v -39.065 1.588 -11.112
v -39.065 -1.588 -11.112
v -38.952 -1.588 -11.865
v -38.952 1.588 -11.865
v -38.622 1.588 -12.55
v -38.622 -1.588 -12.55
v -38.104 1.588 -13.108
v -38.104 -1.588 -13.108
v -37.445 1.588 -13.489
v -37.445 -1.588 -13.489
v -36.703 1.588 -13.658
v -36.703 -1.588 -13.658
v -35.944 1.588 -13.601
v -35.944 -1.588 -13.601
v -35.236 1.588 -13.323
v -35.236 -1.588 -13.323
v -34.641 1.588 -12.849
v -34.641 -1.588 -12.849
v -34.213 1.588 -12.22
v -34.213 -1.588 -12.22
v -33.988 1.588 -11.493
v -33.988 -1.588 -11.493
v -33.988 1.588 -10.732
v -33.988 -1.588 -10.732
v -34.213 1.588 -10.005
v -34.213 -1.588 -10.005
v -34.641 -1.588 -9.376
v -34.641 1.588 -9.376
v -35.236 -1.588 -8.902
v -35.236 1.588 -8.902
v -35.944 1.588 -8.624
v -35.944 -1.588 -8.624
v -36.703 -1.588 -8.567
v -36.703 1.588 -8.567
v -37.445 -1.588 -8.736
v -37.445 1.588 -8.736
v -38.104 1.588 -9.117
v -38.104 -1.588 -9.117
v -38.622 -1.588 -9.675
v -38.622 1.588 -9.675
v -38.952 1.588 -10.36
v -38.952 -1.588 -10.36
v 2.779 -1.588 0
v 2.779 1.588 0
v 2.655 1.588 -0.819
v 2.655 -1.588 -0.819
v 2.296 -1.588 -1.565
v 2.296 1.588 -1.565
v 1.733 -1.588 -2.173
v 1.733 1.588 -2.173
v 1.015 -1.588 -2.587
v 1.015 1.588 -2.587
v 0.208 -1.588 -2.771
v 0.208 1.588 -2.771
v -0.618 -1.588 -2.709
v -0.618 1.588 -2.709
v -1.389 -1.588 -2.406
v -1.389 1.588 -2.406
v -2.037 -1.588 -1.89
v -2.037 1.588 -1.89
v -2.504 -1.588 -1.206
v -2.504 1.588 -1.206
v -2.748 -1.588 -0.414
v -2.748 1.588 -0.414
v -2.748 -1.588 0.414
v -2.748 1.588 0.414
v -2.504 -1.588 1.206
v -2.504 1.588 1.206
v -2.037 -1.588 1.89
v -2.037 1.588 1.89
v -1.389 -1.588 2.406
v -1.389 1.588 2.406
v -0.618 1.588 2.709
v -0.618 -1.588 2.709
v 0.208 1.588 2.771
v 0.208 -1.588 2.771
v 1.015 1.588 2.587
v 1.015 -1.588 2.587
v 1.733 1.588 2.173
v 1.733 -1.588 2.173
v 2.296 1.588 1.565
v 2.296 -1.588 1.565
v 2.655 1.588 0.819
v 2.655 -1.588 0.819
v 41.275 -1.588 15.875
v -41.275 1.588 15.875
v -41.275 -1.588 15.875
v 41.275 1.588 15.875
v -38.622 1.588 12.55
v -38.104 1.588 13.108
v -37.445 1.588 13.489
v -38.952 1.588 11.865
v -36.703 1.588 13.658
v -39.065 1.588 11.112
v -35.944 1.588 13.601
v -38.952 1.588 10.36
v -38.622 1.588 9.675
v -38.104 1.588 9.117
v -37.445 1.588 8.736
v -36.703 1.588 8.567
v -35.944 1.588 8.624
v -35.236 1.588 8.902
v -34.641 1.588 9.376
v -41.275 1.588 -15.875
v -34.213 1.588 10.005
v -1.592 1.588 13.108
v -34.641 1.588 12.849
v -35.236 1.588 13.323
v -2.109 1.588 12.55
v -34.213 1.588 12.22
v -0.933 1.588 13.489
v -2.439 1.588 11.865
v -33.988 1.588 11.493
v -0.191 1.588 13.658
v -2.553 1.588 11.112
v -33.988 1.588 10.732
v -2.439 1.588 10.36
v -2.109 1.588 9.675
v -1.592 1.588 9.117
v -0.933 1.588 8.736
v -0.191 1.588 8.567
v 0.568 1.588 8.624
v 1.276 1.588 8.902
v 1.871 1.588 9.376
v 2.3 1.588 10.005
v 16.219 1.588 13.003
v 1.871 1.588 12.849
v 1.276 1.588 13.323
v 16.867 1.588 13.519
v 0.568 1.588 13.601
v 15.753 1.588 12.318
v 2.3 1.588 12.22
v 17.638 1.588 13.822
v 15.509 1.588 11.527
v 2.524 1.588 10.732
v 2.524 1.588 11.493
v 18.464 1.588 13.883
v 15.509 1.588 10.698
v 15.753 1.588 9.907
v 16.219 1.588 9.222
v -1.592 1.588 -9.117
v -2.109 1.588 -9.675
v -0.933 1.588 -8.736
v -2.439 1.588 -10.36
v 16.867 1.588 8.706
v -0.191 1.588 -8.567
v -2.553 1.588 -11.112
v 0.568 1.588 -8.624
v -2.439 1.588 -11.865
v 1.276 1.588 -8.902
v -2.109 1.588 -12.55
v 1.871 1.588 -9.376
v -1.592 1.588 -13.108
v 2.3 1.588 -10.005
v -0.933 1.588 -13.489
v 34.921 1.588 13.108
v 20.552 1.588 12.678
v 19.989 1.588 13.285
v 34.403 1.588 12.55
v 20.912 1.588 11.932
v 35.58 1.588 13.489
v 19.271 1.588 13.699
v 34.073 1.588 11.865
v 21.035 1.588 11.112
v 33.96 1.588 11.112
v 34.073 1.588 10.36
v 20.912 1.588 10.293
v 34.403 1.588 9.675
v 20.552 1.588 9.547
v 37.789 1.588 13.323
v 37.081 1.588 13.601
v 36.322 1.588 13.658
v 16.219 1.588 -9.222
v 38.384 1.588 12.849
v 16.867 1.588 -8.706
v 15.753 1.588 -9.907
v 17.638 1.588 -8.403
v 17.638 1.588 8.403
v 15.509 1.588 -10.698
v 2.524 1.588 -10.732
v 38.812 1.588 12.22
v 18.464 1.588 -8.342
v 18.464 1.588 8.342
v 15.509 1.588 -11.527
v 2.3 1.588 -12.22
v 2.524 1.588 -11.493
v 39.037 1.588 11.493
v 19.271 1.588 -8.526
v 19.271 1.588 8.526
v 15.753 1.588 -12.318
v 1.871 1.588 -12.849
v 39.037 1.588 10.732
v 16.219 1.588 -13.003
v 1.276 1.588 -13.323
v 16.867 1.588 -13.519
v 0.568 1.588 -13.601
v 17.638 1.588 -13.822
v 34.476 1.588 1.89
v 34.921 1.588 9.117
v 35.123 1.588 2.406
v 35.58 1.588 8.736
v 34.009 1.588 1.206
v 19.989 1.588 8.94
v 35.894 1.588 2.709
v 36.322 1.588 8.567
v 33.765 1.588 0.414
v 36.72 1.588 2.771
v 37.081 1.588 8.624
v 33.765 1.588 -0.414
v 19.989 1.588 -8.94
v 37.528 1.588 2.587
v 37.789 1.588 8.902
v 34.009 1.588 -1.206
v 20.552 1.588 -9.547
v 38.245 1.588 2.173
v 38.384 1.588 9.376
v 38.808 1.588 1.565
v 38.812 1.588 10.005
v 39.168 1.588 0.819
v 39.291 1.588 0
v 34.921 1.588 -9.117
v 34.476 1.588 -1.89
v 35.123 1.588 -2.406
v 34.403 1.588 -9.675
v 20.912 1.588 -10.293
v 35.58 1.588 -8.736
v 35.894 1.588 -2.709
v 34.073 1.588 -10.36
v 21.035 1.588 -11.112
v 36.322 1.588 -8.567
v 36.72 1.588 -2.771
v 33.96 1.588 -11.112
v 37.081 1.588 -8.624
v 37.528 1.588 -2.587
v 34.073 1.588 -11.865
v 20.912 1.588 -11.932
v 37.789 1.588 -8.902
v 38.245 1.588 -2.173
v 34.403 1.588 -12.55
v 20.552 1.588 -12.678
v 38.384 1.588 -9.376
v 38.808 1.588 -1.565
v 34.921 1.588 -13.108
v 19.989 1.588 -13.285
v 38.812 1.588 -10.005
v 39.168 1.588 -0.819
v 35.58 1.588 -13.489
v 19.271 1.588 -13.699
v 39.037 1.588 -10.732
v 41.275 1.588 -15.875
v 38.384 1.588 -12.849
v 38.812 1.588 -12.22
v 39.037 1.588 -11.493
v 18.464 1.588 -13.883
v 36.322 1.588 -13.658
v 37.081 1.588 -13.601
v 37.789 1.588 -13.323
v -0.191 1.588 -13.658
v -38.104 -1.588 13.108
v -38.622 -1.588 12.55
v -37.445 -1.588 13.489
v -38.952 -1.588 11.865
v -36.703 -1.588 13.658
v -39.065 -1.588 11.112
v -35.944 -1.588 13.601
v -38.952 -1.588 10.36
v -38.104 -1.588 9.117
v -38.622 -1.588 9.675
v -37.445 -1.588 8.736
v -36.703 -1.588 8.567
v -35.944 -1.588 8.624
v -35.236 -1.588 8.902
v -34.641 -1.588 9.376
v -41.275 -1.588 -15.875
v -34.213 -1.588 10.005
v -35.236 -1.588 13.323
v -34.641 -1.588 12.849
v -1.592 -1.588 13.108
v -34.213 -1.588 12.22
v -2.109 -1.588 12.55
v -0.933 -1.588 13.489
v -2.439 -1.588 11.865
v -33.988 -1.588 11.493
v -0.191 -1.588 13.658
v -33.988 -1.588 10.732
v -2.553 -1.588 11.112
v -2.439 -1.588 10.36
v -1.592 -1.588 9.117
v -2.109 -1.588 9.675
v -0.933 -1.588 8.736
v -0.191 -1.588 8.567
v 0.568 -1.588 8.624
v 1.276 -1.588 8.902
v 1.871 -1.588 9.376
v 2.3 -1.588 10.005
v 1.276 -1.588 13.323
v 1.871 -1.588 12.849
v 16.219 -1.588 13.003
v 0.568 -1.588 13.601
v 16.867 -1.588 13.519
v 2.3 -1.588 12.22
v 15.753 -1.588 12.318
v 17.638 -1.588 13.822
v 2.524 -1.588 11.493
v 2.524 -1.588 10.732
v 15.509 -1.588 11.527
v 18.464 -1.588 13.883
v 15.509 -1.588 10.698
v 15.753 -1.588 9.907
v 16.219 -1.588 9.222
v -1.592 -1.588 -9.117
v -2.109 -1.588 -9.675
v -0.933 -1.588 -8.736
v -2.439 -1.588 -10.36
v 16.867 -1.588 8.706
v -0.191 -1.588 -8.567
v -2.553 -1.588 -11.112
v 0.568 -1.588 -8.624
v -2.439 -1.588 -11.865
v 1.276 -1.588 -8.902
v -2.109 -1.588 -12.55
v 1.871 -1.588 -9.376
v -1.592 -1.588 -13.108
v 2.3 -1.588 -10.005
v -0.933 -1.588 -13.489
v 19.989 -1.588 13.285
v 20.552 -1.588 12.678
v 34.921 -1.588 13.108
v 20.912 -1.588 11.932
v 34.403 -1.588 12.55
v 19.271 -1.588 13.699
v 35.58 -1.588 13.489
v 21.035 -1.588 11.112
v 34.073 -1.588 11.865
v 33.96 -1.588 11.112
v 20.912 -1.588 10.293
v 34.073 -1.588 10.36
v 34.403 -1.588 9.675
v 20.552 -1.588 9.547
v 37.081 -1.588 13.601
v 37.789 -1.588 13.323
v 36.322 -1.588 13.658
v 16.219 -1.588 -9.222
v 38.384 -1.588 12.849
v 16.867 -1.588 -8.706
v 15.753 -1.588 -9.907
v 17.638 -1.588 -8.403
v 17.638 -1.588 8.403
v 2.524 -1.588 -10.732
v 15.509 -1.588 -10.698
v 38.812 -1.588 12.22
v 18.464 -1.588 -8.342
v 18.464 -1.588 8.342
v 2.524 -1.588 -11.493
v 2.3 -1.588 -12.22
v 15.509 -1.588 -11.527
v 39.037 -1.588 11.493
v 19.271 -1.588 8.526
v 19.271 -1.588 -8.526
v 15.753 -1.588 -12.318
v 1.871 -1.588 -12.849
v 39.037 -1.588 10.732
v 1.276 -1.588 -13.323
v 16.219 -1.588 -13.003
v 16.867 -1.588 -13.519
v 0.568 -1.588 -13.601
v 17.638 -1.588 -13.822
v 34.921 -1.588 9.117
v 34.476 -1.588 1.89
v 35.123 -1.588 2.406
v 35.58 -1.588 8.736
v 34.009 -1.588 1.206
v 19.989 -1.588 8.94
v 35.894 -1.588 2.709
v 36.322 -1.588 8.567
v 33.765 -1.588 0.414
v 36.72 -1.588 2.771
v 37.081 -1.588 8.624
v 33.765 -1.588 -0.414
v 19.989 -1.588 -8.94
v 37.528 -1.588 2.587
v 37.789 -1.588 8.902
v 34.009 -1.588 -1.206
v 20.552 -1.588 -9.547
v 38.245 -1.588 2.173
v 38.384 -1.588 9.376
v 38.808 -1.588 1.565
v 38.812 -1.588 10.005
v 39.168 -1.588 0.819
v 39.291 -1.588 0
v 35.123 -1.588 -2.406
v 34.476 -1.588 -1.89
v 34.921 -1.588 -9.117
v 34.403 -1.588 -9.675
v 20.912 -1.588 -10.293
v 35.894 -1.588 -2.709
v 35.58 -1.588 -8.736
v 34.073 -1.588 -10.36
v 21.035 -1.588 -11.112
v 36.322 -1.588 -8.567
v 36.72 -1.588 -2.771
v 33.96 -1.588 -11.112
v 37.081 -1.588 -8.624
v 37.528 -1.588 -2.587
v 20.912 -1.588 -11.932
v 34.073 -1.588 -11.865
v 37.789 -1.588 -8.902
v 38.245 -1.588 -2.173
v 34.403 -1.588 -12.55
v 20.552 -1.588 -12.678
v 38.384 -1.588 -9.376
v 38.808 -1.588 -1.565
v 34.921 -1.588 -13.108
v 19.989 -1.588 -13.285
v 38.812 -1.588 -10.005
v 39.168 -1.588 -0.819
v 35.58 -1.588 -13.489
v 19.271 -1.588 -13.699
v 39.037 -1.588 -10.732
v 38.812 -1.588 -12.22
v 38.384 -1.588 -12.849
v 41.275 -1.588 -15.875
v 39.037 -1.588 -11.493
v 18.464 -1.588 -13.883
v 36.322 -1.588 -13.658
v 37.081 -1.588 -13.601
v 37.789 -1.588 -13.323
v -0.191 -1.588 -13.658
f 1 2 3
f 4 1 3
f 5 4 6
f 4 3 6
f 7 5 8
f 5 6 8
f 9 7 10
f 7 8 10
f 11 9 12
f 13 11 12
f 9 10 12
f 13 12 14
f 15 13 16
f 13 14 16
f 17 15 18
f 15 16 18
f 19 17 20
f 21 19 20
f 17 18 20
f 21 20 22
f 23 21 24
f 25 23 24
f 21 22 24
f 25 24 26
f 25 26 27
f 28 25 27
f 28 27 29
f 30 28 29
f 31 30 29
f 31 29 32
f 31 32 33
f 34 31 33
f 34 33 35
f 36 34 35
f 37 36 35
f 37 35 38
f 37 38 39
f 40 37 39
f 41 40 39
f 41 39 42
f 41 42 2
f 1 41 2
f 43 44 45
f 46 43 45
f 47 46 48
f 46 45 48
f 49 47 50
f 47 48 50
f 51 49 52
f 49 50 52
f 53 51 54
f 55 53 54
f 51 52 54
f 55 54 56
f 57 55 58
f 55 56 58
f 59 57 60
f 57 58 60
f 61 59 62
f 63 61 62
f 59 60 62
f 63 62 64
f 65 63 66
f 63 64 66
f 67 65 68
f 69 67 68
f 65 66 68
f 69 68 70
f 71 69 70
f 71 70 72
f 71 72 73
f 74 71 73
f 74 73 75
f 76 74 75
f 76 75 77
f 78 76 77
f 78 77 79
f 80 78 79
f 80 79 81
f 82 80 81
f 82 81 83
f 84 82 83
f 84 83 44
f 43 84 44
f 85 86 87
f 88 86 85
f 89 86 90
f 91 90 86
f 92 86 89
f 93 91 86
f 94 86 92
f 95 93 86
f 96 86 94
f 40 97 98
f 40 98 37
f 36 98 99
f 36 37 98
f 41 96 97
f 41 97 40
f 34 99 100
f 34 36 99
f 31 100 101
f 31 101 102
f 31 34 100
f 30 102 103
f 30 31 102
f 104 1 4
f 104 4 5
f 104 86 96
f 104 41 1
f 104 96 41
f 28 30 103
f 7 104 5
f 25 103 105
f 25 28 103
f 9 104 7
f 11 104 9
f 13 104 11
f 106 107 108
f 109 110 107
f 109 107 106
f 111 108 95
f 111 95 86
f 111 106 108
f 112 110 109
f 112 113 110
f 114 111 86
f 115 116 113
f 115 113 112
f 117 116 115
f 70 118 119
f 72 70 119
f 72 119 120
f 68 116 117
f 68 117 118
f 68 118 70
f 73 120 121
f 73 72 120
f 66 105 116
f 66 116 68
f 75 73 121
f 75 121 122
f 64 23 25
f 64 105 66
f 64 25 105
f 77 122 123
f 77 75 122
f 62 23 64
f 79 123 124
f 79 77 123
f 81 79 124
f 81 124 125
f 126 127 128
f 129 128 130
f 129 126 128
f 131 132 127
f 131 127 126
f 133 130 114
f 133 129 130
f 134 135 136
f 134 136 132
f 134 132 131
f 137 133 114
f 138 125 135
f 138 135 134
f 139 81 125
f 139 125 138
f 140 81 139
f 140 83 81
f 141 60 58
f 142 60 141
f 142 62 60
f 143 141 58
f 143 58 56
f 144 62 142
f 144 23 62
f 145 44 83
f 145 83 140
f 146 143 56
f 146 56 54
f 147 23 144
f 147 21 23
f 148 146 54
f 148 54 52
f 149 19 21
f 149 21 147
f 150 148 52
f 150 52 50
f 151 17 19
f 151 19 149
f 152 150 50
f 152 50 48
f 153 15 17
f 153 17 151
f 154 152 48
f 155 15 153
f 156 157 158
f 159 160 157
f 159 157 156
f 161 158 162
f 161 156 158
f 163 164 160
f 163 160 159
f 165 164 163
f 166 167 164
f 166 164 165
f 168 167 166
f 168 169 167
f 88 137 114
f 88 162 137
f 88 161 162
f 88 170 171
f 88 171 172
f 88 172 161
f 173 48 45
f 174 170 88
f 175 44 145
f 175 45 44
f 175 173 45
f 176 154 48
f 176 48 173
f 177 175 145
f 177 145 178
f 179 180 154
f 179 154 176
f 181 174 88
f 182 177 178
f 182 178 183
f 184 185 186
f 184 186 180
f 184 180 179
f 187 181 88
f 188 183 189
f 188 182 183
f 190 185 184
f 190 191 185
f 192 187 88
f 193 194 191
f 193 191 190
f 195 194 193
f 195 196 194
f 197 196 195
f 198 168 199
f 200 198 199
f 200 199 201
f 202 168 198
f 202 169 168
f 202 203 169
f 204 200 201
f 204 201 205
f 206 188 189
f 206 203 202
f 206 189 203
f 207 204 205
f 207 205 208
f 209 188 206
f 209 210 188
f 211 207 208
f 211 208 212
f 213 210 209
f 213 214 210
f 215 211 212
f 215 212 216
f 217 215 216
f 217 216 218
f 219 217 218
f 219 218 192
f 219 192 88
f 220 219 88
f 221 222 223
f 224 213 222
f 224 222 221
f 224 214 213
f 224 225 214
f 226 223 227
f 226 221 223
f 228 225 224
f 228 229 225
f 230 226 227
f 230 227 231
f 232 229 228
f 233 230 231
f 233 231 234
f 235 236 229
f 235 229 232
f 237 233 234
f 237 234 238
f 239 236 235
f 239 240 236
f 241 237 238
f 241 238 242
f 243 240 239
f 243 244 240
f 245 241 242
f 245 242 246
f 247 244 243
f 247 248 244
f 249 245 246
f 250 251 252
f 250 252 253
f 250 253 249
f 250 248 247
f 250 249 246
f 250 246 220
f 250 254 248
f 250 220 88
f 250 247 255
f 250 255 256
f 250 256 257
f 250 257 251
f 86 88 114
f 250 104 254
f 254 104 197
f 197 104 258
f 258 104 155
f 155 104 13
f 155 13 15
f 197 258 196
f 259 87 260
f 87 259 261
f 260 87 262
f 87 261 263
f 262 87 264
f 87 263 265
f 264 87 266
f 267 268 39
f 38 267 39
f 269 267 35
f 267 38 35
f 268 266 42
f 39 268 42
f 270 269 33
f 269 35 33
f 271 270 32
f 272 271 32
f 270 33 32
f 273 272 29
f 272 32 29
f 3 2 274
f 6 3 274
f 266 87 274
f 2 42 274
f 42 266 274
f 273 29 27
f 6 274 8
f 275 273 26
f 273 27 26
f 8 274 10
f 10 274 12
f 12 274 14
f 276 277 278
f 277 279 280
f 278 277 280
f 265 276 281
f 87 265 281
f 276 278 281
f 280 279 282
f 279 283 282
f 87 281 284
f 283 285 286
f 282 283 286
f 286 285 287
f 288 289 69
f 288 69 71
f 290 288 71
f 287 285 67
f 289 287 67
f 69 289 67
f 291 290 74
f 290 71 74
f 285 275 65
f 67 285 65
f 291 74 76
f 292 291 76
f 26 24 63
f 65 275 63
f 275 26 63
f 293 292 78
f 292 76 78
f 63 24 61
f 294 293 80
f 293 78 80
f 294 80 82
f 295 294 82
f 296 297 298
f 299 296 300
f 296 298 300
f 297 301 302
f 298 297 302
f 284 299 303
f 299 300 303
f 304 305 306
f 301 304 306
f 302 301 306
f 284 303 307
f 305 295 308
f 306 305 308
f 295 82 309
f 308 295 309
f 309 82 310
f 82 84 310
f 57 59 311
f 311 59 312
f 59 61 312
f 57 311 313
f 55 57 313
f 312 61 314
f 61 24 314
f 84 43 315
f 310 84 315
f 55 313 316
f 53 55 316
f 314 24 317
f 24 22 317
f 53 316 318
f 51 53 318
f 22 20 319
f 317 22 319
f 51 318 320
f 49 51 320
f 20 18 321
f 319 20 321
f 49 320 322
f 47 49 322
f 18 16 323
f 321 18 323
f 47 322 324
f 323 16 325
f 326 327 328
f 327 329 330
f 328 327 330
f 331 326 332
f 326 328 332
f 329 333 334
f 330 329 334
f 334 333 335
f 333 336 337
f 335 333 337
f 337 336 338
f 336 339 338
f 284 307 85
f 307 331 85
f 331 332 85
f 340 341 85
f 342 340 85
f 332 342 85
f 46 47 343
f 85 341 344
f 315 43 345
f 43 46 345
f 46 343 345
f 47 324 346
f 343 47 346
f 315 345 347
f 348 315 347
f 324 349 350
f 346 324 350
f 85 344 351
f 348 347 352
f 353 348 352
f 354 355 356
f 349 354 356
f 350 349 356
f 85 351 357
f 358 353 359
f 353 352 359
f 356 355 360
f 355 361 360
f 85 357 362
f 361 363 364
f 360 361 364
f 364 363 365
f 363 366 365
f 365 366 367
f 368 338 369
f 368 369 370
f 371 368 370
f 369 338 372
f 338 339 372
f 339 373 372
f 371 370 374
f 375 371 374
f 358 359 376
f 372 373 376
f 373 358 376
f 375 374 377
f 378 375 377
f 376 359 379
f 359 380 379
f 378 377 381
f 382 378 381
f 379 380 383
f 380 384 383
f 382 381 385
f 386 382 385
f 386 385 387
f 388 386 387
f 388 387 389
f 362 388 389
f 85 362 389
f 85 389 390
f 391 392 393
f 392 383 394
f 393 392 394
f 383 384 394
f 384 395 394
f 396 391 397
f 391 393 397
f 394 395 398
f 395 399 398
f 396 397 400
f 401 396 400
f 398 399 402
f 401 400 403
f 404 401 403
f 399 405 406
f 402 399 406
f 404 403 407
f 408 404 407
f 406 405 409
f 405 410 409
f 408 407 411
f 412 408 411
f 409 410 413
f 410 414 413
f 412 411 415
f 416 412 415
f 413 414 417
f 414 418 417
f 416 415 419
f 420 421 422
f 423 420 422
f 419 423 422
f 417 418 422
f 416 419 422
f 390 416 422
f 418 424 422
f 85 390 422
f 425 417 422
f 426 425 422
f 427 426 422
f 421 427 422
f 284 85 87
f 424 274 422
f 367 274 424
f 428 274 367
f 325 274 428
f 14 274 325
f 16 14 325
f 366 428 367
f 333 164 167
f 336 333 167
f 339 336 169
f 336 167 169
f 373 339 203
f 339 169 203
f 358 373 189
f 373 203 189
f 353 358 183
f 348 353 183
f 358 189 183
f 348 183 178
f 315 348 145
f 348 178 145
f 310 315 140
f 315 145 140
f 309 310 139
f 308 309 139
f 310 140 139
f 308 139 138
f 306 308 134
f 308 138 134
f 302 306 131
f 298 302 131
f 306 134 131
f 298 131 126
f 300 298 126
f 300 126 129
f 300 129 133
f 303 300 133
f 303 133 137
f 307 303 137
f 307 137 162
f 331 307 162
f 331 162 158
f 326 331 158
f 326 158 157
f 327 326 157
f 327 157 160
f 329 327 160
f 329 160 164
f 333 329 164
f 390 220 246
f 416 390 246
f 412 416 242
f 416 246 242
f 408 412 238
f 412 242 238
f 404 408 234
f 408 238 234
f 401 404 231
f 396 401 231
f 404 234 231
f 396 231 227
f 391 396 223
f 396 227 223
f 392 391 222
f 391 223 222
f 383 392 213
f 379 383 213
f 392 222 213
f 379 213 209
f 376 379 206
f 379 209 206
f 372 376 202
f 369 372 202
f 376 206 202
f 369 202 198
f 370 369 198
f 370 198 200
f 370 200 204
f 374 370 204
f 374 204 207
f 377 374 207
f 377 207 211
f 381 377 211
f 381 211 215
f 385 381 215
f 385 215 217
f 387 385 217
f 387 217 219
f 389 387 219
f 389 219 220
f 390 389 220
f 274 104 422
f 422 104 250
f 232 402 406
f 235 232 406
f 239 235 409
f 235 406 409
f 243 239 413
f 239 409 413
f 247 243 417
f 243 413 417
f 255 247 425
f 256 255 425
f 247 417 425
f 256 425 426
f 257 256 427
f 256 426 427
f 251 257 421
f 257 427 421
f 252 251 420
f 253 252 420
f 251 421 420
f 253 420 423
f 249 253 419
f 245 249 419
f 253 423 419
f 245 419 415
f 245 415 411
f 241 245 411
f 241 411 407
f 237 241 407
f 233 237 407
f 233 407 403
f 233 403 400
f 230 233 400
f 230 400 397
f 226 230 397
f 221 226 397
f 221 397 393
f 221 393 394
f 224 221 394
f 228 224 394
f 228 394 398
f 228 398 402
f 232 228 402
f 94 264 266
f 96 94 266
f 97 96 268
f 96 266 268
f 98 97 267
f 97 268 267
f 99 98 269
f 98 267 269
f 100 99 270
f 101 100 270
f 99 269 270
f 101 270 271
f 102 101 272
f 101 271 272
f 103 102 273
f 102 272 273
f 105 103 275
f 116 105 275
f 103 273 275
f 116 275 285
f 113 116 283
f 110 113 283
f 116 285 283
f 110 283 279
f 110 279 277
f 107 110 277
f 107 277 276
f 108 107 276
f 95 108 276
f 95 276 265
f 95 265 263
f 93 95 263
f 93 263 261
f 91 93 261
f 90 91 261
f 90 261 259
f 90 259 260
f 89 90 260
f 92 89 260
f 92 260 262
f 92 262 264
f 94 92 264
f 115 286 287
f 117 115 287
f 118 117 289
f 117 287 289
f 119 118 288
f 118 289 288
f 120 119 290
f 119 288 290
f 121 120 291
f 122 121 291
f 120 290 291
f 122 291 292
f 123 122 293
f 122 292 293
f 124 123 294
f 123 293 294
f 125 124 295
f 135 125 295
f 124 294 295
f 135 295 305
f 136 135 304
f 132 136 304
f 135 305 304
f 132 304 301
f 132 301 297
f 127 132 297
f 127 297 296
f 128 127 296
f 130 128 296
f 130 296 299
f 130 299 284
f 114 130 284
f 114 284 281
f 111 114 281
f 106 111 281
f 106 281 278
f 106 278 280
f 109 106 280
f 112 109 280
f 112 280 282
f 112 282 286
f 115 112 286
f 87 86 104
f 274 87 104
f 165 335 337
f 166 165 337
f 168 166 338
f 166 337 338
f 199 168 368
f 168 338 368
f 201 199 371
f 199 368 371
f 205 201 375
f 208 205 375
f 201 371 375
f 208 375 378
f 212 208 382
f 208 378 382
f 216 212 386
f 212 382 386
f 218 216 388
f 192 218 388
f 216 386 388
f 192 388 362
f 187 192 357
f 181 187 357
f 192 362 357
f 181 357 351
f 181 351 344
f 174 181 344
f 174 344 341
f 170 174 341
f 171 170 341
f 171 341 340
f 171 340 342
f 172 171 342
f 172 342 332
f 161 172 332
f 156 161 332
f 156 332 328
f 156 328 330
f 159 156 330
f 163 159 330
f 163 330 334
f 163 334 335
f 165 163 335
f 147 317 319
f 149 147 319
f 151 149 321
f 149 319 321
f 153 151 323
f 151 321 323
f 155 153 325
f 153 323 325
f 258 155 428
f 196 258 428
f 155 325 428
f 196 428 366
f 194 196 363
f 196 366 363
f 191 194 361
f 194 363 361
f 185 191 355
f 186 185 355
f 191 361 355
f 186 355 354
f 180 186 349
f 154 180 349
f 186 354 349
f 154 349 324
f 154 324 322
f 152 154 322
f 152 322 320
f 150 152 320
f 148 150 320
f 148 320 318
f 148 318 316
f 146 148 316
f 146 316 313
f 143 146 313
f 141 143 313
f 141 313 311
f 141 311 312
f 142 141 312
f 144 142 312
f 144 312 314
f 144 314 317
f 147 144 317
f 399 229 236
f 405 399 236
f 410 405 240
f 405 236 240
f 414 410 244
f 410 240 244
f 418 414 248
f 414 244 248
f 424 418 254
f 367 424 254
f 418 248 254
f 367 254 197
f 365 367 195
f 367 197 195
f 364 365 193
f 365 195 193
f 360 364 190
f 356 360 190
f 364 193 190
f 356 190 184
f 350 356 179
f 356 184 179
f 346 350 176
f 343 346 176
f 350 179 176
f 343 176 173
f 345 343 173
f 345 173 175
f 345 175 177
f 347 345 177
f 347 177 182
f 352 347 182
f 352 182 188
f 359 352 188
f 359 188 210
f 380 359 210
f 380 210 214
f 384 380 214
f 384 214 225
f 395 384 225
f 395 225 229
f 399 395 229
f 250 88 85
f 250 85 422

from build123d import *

# Parameters (mm, degrees)
SKETCH1_W                                      = 82.55
SKETCH1_H                                      = 31.75
PLATE_DEPTH                                    = 1.5875
F_10_CLEARANCE_HOLE1_D                         = 5.1054
CBORE_FOR_4_SOCKET_HEAD_CAP_SCREW1_D           = 3.2639
CBORE_FOR_4_SOCKET_HEAD_CAP_SCREW1_CBORE_D     = 5.55752
CBORE_FOR_4_SOCKET_HEAD_CAP_SCREW1_CBORE_DEPTH = 9.1948


with BuildPart() as part:
    # Sketch1 → Plate (new, symmetric)
    with BuildSketch(Plane(origin=(0, 0, 0), x_dir=(1, 0, 0), z_dir=(0, 1, 0))):
        Rectangle(SKETCH1_W, SKETCH1_H)
    extrude(amount=PLATE_DEPTH, both=True)

    # #10 Clearance Hole1 (through all)
    with Locations(Plane(origin=(0, 1.5875, 0), x_dir=(1, 0, 0), z_dir=(0, 1, 0))):
        with Locations((-36.5125, 11.1125), (36.5125, 11.1125), (36.5125, -11.1125), (-36.5125, -11.1125), (0, -11.1125), (0, 11.1125)):
            Hole(F_10_CLEARANCE_HOLE1_D / 2)

    # CBORE for #4 Socket Head Cap Screw1 (through all)
    with Locations(Plane(origin=(0, 1.5875, 0), x_dir=(1, 0, 0), z_dir=(0, 1, 0))):
        with Locations((0, 0), (36.5125, 0), (18.25625, 11.1125), (18.25625, -11.1125)):
            CounterBoreHole(CBORE_FOR_4_SOCKET_HEAD_CAP_SCREW1_D / 2, CBORE_FOR_4_SOCKET_HEAD_CAP_SCREW1_CBORE_D / 2, CBORE_FOR_4_SOCKET_HEAD_CAP_SCREW1_CBORE_DEPTH)


solid = part.part
